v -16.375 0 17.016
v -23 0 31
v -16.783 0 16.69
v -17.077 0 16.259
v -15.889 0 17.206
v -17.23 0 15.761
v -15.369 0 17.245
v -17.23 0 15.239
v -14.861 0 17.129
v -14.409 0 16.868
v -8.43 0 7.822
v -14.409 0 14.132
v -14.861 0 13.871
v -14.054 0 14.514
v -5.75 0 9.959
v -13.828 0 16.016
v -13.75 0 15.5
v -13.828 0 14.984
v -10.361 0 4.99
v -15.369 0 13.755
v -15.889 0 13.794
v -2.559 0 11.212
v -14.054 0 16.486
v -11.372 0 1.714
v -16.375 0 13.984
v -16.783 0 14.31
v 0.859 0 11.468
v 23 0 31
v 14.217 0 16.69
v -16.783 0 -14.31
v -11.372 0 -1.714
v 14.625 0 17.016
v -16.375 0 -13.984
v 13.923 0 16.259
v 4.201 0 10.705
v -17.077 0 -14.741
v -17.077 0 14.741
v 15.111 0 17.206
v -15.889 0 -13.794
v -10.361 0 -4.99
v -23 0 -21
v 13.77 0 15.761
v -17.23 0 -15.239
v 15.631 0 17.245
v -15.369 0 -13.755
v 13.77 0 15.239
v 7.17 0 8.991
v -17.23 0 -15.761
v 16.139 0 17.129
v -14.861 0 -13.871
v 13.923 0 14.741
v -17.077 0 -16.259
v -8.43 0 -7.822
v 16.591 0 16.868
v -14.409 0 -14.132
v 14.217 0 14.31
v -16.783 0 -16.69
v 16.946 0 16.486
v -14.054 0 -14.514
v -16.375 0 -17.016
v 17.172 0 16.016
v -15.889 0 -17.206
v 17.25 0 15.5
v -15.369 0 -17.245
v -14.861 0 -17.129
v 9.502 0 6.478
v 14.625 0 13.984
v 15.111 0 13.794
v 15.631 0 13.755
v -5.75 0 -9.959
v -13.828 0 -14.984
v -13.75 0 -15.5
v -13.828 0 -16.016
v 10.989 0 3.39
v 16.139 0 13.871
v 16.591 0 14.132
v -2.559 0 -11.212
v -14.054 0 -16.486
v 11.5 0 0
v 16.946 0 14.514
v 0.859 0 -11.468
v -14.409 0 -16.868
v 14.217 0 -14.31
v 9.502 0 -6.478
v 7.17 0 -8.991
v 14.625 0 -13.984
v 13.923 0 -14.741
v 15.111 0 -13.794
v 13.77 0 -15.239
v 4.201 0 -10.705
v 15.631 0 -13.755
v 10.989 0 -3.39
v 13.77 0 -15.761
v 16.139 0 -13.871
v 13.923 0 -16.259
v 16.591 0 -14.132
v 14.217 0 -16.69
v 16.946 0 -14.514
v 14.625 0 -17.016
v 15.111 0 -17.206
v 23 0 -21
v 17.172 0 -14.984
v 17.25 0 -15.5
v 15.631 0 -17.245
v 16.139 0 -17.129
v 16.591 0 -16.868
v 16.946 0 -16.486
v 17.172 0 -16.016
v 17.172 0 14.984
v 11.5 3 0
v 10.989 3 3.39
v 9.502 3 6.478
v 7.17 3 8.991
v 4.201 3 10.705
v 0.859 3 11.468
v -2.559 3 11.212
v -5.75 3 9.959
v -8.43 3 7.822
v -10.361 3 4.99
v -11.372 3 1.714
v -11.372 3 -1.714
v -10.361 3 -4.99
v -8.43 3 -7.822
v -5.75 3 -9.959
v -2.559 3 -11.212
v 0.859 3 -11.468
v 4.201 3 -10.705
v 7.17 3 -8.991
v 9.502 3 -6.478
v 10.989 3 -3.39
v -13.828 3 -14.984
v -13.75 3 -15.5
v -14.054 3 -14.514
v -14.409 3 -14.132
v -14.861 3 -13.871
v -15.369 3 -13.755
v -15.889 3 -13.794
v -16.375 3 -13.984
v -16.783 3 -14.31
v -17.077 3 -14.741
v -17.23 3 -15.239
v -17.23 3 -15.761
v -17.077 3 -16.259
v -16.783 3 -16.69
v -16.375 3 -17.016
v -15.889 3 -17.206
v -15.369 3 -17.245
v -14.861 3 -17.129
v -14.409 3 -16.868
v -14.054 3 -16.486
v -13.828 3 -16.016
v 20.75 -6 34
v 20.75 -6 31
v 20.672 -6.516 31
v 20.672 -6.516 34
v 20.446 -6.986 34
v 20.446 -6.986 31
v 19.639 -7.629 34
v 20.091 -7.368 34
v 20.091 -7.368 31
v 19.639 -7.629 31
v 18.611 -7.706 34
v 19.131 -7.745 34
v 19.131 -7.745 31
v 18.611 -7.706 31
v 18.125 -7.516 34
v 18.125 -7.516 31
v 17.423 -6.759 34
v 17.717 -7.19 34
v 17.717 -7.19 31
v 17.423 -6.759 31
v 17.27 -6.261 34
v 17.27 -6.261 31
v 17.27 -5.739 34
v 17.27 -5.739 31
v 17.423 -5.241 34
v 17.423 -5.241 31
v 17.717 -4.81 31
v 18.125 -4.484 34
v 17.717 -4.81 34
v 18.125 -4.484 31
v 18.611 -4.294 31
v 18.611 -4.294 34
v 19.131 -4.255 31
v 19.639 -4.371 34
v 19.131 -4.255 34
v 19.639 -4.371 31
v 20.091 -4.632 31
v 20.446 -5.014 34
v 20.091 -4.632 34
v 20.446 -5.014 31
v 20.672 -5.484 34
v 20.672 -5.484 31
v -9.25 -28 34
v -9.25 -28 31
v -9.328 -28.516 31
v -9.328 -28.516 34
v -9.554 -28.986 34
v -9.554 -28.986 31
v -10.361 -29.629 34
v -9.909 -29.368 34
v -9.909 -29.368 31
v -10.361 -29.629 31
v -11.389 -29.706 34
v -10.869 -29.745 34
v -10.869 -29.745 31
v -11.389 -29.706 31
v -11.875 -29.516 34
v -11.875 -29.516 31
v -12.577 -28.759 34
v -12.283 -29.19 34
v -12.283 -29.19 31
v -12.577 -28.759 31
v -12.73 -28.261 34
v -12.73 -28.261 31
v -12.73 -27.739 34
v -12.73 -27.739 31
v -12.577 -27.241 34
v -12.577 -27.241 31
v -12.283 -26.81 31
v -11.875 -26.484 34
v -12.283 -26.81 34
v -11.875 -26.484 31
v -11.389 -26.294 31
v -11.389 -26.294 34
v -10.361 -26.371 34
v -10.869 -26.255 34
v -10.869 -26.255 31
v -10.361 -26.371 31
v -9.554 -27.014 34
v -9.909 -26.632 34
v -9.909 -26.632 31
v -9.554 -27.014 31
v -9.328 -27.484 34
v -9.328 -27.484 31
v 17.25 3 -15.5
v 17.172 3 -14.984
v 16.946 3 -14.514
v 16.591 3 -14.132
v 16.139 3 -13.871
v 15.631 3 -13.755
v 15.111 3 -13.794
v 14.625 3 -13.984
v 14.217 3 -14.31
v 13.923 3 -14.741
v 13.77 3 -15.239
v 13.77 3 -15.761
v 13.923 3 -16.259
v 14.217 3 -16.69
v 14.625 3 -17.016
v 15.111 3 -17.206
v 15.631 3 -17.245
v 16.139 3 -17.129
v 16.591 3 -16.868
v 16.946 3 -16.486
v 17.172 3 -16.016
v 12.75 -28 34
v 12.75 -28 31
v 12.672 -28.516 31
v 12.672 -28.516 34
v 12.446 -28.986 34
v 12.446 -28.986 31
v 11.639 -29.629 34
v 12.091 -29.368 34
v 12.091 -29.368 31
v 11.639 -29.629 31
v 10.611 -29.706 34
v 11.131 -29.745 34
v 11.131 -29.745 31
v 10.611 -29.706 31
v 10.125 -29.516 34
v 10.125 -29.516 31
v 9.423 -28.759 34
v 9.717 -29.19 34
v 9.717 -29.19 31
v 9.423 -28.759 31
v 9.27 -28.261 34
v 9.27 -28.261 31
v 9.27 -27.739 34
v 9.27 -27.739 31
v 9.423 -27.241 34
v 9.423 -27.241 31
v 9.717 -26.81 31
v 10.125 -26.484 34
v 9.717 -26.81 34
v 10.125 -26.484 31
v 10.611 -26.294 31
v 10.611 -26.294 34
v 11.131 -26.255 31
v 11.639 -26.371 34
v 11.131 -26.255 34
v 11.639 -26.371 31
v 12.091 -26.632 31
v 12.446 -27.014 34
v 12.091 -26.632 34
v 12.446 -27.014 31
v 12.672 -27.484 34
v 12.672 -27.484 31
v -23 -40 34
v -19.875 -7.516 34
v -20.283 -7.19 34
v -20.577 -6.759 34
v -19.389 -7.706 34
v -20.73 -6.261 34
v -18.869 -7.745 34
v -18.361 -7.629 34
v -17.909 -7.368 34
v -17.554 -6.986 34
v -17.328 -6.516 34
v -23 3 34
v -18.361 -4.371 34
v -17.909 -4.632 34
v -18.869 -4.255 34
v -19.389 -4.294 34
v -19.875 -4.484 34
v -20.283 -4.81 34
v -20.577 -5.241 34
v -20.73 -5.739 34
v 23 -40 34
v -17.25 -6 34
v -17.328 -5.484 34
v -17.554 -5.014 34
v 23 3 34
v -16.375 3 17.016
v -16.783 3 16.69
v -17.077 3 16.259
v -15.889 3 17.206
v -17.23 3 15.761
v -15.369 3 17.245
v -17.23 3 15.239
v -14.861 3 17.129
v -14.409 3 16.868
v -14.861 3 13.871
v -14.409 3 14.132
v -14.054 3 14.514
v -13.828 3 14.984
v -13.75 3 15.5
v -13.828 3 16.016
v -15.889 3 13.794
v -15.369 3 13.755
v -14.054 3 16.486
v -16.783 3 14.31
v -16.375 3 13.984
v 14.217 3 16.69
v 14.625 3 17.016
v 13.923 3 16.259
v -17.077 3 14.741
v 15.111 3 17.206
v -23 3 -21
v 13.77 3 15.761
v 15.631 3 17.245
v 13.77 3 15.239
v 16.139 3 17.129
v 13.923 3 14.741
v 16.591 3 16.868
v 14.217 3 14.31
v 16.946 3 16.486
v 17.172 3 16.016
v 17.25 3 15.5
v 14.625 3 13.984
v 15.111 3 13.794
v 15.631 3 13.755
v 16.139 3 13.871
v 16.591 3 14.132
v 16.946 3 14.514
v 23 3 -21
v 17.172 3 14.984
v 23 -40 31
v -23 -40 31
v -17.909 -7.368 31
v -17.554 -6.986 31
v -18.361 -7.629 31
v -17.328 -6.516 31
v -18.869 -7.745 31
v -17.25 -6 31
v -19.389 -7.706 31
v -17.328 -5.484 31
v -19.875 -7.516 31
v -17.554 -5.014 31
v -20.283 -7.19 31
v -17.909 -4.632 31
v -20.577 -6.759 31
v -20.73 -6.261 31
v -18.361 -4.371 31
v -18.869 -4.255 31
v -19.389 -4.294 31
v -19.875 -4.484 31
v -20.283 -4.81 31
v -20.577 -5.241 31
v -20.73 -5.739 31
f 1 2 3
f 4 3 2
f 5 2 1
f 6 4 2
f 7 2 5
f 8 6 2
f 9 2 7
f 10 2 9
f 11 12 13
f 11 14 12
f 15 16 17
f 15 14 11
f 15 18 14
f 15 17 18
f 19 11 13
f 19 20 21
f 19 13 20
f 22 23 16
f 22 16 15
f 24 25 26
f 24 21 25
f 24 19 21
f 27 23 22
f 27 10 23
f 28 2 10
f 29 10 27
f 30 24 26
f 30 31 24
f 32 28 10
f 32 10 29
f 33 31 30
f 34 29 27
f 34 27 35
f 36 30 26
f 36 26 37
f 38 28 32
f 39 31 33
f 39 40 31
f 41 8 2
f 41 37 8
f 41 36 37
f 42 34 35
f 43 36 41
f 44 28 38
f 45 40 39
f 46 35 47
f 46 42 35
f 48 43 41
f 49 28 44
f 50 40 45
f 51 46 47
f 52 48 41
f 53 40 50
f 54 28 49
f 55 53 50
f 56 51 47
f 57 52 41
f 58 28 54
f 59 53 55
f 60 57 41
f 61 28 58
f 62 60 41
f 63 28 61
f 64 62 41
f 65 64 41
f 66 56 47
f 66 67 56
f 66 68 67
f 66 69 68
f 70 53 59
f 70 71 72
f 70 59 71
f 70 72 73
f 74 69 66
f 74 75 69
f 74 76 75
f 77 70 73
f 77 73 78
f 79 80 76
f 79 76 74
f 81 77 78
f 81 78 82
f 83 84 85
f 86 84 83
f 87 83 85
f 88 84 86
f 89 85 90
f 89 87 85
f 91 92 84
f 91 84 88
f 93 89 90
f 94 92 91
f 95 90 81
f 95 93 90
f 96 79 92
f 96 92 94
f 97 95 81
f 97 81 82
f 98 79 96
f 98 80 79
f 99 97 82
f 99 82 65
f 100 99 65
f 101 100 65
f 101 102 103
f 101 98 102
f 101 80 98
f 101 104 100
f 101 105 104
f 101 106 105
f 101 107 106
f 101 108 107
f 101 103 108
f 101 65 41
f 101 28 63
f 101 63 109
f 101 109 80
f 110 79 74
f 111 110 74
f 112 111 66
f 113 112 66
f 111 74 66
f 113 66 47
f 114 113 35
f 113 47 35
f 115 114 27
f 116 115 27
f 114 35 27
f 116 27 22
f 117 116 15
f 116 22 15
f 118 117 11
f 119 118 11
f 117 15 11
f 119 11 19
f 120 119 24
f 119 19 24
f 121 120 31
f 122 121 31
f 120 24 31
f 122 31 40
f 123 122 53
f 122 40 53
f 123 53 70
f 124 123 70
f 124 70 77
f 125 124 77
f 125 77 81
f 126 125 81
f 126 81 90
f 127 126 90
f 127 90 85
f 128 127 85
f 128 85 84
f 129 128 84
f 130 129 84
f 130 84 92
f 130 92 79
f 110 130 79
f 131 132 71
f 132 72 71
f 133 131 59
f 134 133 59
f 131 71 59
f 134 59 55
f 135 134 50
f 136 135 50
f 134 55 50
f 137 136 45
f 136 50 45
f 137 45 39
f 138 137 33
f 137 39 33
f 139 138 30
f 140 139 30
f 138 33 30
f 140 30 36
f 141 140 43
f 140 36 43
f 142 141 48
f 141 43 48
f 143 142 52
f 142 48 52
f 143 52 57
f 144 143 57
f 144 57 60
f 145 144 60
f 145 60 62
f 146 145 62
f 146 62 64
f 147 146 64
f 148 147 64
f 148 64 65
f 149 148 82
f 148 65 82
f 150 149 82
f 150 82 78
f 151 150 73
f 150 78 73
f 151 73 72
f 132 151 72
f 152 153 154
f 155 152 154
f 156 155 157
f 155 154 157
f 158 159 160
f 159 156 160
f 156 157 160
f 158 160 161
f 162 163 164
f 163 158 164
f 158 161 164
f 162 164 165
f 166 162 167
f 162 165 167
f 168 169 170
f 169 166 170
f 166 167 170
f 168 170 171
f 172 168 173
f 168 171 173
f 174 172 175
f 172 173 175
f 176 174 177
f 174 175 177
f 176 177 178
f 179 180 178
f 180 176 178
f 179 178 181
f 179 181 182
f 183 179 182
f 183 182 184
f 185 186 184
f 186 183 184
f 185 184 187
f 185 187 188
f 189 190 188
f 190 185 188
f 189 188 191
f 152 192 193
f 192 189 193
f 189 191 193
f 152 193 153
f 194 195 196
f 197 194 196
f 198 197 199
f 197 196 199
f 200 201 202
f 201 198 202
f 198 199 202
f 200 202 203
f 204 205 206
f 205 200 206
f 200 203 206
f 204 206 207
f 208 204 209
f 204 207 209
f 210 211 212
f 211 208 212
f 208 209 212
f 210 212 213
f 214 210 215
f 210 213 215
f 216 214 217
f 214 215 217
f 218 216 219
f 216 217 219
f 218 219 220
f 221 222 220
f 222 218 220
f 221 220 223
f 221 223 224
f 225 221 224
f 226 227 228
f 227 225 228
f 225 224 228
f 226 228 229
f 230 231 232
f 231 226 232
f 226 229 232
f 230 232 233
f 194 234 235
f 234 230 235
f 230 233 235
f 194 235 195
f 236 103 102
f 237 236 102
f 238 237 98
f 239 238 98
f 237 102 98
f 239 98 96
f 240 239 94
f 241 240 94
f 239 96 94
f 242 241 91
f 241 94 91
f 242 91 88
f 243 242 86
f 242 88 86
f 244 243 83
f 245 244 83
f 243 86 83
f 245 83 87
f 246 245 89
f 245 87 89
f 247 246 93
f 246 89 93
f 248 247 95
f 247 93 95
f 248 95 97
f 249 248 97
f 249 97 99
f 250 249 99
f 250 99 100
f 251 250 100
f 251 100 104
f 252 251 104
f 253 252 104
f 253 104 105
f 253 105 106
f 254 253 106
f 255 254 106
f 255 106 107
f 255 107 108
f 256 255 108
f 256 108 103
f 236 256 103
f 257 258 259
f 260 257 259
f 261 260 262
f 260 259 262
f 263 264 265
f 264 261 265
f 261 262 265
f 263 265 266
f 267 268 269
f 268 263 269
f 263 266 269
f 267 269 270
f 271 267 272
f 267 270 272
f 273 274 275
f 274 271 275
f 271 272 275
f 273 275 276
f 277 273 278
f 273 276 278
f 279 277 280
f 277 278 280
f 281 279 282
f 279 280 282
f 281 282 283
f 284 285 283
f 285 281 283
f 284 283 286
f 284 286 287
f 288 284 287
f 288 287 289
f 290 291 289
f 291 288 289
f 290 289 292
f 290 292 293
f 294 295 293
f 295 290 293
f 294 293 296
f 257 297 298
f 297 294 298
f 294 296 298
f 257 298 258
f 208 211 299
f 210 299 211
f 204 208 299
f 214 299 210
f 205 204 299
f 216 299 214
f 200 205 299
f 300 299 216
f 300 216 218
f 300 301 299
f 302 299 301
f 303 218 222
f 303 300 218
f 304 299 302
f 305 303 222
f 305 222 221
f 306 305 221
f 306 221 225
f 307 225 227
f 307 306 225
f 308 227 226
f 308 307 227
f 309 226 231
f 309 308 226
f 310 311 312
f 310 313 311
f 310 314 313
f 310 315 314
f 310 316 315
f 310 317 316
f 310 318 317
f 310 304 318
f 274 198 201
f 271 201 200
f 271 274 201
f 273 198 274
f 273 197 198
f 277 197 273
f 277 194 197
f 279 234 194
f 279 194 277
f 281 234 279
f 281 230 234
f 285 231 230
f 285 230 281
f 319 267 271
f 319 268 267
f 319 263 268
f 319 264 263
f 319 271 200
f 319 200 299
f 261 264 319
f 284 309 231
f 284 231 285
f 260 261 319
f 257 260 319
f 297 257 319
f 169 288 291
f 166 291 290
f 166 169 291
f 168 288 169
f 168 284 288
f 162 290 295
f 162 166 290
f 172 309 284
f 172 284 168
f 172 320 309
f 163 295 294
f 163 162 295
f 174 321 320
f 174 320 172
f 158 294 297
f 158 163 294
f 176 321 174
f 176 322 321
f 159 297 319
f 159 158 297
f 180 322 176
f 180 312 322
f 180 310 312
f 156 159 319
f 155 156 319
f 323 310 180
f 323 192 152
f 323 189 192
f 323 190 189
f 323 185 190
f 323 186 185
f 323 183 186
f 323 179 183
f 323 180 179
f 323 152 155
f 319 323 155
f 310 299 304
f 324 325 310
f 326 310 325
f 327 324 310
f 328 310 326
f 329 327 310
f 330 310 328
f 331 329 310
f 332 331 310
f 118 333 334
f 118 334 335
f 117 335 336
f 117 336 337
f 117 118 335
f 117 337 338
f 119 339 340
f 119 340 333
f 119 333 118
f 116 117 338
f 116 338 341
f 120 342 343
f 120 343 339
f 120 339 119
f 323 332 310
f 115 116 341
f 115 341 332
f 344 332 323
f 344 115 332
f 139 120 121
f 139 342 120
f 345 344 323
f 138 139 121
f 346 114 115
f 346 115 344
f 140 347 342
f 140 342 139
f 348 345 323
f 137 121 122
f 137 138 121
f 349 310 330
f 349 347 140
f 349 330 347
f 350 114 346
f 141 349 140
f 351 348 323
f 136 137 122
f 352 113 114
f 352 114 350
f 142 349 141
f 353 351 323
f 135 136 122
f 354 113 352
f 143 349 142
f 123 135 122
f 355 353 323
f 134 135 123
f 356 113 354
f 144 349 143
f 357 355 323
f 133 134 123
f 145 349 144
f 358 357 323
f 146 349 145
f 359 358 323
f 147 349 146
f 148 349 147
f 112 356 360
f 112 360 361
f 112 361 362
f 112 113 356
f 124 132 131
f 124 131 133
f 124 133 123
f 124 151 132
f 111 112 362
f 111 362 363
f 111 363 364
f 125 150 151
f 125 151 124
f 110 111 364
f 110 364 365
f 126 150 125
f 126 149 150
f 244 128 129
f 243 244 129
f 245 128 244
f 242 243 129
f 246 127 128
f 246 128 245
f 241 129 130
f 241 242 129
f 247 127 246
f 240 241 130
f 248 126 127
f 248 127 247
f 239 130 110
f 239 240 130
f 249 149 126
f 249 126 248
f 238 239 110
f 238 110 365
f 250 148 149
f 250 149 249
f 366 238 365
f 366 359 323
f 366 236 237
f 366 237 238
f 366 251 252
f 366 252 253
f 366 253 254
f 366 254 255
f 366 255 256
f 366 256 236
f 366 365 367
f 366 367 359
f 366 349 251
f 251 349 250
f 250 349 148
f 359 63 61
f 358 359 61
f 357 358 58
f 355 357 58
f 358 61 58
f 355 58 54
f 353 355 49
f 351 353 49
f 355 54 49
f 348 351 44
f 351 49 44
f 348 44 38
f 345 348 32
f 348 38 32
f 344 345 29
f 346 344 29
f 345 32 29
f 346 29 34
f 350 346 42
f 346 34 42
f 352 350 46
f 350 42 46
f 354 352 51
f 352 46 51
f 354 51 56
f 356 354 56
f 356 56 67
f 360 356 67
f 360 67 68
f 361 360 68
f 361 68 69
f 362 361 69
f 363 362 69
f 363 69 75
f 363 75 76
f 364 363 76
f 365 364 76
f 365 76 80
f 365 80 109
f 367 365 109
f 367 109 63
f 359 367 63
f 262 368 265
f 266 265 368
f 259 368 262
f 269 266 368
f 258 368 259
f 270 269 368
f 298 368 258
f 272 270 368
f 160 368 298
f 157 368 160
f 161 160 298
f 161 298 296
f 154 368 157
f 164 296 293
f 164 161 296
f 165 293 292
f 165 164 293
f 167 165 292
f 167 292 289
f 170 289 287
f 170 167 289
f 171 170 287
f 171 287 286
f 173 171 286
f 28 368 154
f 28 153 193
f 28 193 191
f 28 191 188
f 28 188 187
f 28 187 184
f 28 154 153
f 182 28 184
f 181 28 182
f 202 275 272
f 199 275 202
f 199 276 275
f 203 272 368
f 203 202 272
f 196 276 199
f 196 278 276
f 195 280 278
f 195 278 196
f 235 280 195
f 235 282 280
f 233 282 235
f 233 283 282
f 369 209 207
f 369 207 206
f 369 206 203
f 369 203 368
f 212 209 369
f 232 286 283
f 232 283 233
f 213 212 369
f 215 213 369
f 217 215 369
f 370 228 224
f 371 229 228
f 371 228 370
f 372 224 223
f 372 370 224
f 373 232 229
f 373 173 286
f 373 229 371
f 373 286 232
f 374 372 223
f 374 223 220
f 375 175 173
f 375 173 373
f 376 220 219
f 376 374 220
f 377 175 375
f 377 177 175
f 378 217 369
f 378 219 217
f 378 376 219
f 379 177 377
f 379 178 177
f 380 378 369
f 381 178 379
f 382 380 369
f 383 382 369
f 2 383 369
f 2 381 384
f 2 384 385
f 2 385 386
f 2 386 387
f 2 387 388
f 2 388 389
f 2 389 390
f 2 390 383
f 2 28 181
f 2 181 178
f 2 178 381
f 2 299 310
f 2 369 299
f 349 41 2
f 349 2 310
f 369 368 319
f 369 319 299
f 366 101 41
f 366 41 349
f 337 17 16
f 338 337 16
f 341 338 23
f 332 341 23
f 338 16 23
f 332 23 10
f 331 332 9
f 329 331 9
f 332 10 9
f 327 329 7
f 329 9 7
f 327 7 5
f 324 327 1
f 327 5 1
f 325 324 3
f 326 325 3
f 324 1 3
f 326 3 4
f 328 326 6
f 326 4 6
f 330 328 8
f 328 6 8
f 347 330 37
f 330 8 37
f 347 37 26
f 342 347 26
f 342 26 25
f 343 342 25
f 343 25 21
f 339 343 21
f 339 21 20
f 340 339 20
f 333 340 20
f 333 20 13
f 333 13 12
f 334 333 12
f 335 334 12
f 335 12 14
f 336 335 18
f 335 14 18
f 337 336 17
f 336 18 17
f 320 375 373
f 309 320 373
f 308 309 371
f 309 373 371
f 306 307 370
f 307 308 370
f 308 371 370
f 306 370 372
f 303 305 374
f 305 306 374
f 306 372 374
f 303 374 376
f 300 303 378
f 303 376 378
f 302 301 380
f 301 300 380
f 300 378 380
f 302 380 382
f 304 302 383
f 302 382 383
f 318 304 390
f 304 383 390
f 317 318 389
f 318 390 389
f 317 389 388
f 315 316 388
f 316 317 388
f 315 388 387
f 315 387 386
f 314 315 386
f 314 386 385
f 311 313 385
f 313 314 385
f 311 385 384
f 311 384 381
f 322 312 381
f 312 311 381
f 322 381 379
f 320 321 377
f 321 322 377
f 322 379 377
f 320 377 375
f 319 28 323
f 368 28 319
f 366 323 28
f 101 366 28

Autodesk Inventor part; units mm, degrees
ref_plane "YZ Plane" through (0, 0, 0) normal (1, 0, 0) x (0, 1, 0)
ref_plane "XZ Plane" through (0, 0, 0) normal (0, 1, 0) x (-1, 0, 0)
ref_plane "XY Plane" through (0, 0, 0) normal (0, 0, 1) x (1, 0, 0)
sketch "草图2" plane through (0, 0, 0) normal (0, 1, 0) x (-1, 0, 0)
  line L0 (-21, 21) -> (21, 21)
  line L1 (21, 21) -> (21, -21)
  line L2 (21, -21) -> (-21, -21)
  line L3 (-21, -21) -> (-21, 21)
  line L4 (-21, 21) -> (21, -21) construction
  line L5 (21, 21) -> (-21, -21) construction
  point P0 (0, 0)
  dimension "d3" = 42
  dimension "d4" = 42
extrude "拉伸2" add sketch "草图2" along normal blind 3
sketch "草图3" plane through (-21, 0, 21) normal (0, 0, 1) x (1, 0, 0)
  line L0 (0, 3) -> (42, 3) projected
  line L1 (0, 3) -> (42, 3)
  line L2 (42, 3) -> (42, -40)
  line L3 (42, -40) -> (0, -40)
  line L4 (0, -40) -> (0, 3)
  point P0 (21, 0)
  dimension "d7" = 43
extrude "拉伸3" add sketch "草图3" along normal blind 3
sketch "草图7" plane through (0, 0, 0) normal (0, -1, 0) x (1, 0, 0)
  circle A0 centre (0, 0) radius 11.5
  circle A1 centre (-15.5, 15.5) radius 1.75
  circle A2 centre (-15.5, -15.5) radius 1.75
  circle A3 centre (15.5, -15.5) radius 1.75
  circle A4 centre (15.5, 15.5) radius 1.75
  dimension "d17" = 23
  dimension "d18" = 3.5
  dimension "d19" = 15.5
  dimension "d20" = 15.5
  dimension "d21" = 15.5
  dimension "d22" = 15.5
extrude "拉伸6" cut sketch "草图7" against normal blind 3
sketch "草图9" plane through (-21, 0, 21) normal (0, 0, -1) x (-1, 0, 0)
  circle A0 centre (-40, -6) radius 1.75
  line L0 (0, 0) -> (-42, 0) projected
  line L1 (-42, 3) -> (0, 3) projected
  line L2 (-21, 0) -> (-21, -40) construction
  line L3 (0, -40) -> (-42, -40) projected
  circle A1 centre (-2, -6) radius 1.75
  circle A2 centre (-32, -28) radius 1.75
  circle A3 centre (-10, -28) radius 1.75
  dimension "d32" = 3.5
  dimension "d34" = 9
  dimension "d35" = 19
  dimension "d36" = 3.5
  dimension "d37" = 11
  dimension "d38" = 22
extrude "拉伸8" cut sketch "草图9" against normal blind 10
sketch "草图10" plane through (21, 0, -21) normal (1, 0, 0) x (0, 0, -1)
  line L0 (0, 0) -> (-42, 0) projected
  line L1 (0, 0) -> (0, 3) projected
  line L2 (0, 3) -> (-45, 3) projected
  line L3 (-45, -40) -> (-45, 3) projected
  line L4 (-42, -40) -> (-45, -40) projected
  line L5 (-42, -40) -> (-42, 0) projected
  point P0 (-21, 0)
extrude "拉伸9" add sketch "草图10" along normal blind 2
sketch "草图11" plane through (-21, 0, -21) normal (-1, 0, 0) x (0, 0, 1)
  line L0 (42, 0) -> (0, 0) projected
  line L1 (42, 0) -> (42, -40) projected
  line L2 (42, -40) -> (45, -40) projected
  line L3 (45, 3) -> (45, -40) projected
  line L4 (0, 3) -> (45, 3) projected
  line L5 (0, 0) -> (0, 3) projected
  point P0 (21, 0)
extrude "拉伸10" add sketch "草图11" along normal blind 2
sketch "草图12" plane through (-21, 0, 24) normal (0, 0, 1) x (1, 0, 0)
  circle A0 centre (32, -28) radius 1.75 projected
  circle A1 centre (40, -6) radius 1.75 projected
  circle A2 centre (2, -6) radius 1.75 projected
  circle A3 centre (10, -28) radius 1.75 projected
  line L0 (44, -40) -> (-2, -40) projected
  line L1 (44, 3) -> (44, -40) projected
  line L2 (-2, 3) -> (44, 3) projected
  line L3 (-2, -40) -> (-2, 3) projected
  point P0 (21, 0)
extrude "拉伸11" add sketch "草图12" along normal blind 10
sketch "草图13" plane through (-21, 0, 21) normal (0, 0, -1) x (-1, 0, 0)
  circle A0 centre (-32, -28) radius 1.75 projected
  circle A1 centre (-40, -6) radius 1.75 projected
  circle A2 centre (-2, -6) radius 1.75 projected
  circle A3 centre (-10, -28) radius 1.75 projected
  line L0 (-44, 0) -> (2, 0) projected
  line L1 (-44, -40) -> (-44, 0) projected
  line L2 (-44, -40) -> (2, -40) projected
  line L3 (2, 0) -> (2, -40) projected
  point P0 (-21, 0)
extrude "拉伸12" cut sketch "草图13" against normal blind 10
properties part number "电机座2"
